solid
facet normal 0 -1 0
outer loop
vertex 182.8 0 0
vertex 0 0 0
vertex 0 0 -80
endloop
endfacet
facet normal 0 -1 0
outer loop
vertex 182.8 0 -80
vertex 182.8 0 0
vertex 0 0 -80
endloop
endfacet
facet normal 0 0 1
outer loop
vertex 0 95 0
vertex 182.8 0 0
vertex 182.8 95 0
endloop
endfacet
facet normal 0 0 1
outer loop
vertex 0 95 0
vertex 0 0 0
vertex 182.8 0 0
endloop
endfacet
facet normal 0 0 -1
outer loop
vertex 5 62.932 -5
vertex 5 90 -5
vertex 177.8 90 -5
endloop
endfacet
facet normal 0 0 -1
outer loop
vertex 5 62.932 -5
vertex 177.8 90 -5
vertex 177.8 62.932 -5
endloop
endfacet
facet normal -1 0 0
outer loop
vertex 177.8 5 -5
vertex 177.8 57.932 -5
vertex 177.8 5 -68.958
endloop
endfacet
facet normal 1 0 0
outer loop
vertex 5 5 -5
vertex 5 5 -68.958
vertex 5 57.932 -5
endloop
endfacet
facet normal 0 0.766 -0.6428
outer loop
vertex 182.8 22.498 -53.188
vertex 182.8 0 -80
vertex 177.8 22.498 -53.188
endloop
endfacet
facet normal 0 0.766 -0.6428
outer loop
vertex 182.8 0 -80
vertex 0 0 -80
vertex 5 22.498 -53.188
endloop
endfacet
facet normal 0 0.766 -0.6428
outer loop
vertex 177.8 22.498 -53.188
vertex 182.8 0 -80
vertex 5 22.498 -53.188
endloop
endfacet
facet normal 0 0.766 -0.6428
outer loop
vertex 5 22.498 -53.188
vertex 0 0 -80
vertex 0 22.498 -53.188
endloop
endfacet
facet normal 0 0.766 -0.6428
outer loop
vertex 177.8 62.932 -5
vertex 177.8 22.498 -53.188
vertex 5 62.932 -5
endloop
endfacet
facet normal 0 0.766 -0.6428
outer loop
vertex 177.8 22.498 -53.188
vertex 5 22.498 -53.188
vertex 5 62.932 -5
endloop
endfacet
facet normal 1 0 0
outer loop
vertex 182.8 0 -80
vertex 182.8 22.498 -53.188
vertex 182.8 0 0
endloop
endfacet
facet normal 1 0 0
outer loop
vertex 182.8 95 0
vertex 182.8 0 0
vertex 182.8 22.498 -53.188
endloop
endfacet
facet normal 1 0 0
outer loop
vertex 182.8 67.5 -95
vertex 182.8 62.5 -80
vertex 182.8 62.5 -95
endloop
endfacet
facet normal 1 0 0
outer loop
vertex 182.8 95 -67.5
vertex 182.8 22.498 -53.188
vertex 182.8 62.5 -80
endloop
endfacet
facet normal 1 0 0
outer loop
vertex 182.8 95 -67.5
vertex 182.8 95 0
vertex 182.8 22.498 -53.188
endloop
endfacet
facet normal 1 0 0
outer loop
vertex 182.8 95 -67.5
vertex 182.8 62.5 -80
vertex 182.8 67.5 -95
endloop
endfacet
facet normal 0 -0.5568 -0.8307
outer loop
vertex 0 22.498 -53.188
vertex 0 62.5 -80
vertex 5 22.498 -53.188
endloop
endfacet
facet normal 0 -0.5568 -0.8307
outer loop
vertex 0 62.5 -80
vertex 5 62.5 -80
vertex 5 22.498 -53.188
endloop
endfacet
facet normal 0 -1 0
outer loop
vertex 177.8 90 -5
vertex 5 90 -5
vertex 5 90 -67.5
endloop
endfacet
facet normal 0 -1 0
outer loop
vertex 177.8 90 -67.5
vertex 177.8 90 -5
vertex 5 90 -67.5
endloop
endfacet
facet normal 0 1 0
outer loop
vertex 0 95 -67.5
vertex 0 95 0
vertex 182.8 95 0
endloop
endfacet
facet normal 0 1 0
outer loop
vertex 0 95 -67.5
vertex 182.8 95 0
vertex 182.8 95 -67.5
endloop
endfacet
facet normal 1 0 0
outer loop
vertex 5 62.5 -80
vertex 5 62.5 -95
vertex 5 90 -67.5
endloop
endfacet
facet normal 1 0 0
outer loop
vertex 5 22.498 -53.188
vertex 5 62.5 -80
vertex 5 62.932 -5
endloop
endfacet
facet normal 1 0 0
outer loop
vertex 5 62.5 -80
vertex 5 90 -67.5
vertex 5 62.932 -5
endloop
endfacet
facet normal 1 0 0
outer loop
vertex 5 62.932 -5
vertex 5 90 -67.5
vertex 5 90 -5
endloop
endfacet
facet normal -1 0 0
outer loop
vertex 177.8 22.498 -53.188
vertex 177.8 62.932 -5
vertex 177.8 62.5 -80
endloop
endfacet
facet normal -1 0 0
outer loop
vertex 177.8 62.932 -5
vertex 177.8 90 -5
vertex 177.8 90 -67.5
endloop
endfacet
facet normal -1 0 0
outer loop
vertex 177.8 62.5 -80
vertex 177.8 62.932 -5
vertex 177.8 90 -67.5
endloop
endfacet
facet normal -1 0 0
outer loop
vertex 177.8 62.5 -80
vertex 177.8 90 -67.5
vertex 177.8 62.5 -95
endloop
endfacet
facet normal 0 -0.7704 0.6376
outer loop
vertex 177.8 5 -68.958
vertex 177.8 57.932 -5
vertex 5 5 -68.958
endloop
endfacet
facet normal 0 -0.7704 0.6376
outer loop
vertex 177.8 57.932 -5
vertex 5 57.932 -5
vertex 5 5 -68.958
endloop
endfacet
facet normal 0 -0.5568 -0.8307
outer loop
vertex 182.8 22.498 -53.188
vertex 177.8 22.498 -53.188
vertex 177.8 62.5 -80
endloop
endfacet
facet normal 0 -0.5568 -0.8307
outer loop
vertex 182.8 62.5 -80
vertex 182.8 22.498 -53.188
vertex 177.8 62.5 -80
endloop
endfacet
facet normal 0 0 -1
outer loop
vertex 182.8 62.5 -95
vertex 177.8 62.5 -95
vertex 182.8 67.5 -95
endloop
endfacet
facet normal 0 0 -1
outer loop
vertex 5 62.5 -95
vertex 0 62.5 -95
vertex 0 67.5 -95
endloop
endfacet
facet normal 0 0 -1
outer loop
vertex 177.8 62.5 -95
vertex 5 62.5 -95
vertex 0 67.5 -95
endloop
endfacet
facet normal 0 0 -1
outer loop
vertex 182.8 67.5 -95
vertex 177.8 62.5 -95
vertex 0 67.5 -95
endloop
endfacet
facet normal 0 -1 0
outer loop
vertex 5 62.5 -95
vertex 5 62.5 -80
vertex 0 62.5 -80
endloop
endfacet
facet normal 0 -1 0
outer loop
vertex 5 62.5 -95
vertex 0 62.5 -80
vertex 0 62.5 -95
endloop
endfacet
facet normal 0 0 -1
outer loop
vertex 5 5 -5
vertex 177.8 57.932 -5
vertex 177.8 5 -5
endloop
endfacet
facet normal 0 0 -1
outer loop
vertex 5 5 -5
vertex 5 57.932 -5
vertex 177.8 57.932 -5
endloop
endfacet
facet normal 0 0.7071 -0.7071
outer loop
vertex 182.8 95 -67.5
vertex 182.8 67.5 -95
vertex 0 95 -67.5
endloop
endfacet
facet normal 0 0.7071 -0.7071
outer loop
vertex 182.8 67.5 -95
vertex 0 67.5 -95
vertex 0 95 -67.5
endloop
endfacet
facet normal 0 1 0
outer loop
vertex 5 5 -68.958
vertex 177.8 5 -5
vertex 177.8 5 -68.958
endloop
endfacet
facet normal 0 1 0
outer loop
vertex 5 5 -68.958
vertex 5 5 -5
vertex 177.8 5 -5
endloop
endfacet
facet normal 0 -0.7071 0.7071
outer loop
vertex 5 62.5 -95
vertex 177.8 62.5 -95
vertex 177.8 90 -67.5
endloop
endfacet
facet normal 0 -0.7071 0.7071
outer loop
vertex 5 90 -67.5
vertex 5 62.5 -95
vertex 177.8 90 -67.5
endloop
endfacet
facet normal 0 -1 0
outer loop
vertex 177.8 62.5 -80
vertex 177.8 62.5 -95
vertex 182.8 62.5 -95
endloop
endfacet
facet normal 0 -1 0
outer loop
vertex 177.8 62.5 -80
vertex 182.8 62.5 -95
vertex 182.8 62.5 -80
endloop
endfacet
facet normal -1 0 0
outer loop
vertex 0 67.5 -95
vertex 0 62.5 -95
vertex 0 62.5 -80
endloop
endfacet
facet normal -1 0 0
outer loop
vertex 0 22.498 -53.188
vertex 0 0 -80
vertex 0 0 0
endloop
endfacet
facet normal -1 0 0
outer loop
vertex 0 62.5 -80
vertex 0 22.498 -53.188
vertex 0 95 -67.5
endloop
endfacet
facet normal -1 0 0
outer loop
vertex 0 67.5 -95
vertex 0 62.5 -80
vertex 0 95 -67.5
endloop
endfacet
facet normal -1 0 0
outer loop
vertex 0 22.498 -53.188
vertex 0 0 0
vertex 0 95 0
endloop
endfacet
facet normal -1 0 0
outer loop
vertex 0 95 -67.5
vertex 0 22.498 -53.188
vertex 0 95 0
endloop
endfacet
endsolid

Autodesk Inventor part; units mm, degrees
ref_plane "YZ Plane" through (0, 0, 0) normal (1, 0, 0) x (0, 1, 0)
ref_plane "XZ Plane" through (0, 0, 0) normal (0, 1, 0) x (-1, 0, 0)
sketch "Sketch1" plane through (0, 0, 0) normal (1, 0, 0) x (0, 1, 0)
  line L0 (0, 0) -> (95, 0)
  line L1 (95, 0) -> (95, -67.5)
  line L2 (0, 0) -> (0, -80)
  line L3 (0, -80) -> (62.9325, -5)
  line L4 (0, -80) -> (117.6394, -80) construction
  line L5 (67.5, -95) -> (95, -67.5)
  line L6 (90, -5) -> (90, -67.5)
  line L7 (62.5, -95) -> (67.5, -95)
  line L8 (62.5, -95) -> (90, -67.5)
  line L9 (57.9325, -5) -> (5, -68.9585)
  line L10 (5, -5) -> (5, -68.9585)
  line L11 (90, -5) -> (62.9325, -5)
  line L12 (57.9325, -5) -> (5, -5)
  point P0 (0, -75)
  dimension "d0" = 95
  dimension "d2" = 80
  dimension "d5" = 50
  dimension "d22" = 5
  dimension "d23" = 5
  dimension "d24" = 27.5
  dimension "d27" = 5
  dimension "d28" = 5
  dimension "d29" = 5
  dimension "d30" = 50.389
  dimension "d31" = 95
  dimension "d32" = 67.5
  dimension "d34" = 68.9585
  dimension "d35" = 5
  dimension "d36" = 27.5
extrude "Extrusion1" add sketch "Sketch1" along normal blind 177.8
sketch "Sketch3" plane through (177.8, 0, 0) normal (1, 0, 0) x (0, 0, -1)
  line L0 (0, 95) -> (0, 0) projected
  line L1 (67.5, 95) -> (0, 95) projected
  line L2 (95, 67.5) -> (67.5, 95) projected
  line L3 (0, 0) -> (80, 0) projected
  line L4 (0, 95) -> (67.5, 95)
  line L5 (80, 0) -> (0, 0)
  line L6 (0, 0) -> (0, 95)
  line L7 (80, 0) -> (5, 62.9325) projected
  line L8 (80, 0) -> (53.1884, 22.4976)
  line L9 (53.1884, 22.4976) -> (80, 62.5)
  line L10 (95, 62.5) -> (67.5, 90) projected
  line L11 (95, 62.5) -> (80, 62.5)
  line L12 (67.5, 95) -> (95, 67.5) projected
  line L13 (67.5, 95) -> (95, 67.5)
  line L14 (95, 67.5) -> (95, 62.5)
  line L15 (95, 62.5) -> (95, 67.5)
  dimension "d37" = 35
  dimension "d39" = 15
  dimension "d40" = 40.0024
extrude "Extrusion2" add sketch "Sketch3" along normal blind 5
ref_plane "Work Plane1" through (91.4, 0, 0) normal (1, 0, 0) x (0, 0, -1)
mirror "Mirror1" about plane through (91.4, 0, 0) normal (1, 0, 0) of "Extrusion2"
properties part number "plowV3"
